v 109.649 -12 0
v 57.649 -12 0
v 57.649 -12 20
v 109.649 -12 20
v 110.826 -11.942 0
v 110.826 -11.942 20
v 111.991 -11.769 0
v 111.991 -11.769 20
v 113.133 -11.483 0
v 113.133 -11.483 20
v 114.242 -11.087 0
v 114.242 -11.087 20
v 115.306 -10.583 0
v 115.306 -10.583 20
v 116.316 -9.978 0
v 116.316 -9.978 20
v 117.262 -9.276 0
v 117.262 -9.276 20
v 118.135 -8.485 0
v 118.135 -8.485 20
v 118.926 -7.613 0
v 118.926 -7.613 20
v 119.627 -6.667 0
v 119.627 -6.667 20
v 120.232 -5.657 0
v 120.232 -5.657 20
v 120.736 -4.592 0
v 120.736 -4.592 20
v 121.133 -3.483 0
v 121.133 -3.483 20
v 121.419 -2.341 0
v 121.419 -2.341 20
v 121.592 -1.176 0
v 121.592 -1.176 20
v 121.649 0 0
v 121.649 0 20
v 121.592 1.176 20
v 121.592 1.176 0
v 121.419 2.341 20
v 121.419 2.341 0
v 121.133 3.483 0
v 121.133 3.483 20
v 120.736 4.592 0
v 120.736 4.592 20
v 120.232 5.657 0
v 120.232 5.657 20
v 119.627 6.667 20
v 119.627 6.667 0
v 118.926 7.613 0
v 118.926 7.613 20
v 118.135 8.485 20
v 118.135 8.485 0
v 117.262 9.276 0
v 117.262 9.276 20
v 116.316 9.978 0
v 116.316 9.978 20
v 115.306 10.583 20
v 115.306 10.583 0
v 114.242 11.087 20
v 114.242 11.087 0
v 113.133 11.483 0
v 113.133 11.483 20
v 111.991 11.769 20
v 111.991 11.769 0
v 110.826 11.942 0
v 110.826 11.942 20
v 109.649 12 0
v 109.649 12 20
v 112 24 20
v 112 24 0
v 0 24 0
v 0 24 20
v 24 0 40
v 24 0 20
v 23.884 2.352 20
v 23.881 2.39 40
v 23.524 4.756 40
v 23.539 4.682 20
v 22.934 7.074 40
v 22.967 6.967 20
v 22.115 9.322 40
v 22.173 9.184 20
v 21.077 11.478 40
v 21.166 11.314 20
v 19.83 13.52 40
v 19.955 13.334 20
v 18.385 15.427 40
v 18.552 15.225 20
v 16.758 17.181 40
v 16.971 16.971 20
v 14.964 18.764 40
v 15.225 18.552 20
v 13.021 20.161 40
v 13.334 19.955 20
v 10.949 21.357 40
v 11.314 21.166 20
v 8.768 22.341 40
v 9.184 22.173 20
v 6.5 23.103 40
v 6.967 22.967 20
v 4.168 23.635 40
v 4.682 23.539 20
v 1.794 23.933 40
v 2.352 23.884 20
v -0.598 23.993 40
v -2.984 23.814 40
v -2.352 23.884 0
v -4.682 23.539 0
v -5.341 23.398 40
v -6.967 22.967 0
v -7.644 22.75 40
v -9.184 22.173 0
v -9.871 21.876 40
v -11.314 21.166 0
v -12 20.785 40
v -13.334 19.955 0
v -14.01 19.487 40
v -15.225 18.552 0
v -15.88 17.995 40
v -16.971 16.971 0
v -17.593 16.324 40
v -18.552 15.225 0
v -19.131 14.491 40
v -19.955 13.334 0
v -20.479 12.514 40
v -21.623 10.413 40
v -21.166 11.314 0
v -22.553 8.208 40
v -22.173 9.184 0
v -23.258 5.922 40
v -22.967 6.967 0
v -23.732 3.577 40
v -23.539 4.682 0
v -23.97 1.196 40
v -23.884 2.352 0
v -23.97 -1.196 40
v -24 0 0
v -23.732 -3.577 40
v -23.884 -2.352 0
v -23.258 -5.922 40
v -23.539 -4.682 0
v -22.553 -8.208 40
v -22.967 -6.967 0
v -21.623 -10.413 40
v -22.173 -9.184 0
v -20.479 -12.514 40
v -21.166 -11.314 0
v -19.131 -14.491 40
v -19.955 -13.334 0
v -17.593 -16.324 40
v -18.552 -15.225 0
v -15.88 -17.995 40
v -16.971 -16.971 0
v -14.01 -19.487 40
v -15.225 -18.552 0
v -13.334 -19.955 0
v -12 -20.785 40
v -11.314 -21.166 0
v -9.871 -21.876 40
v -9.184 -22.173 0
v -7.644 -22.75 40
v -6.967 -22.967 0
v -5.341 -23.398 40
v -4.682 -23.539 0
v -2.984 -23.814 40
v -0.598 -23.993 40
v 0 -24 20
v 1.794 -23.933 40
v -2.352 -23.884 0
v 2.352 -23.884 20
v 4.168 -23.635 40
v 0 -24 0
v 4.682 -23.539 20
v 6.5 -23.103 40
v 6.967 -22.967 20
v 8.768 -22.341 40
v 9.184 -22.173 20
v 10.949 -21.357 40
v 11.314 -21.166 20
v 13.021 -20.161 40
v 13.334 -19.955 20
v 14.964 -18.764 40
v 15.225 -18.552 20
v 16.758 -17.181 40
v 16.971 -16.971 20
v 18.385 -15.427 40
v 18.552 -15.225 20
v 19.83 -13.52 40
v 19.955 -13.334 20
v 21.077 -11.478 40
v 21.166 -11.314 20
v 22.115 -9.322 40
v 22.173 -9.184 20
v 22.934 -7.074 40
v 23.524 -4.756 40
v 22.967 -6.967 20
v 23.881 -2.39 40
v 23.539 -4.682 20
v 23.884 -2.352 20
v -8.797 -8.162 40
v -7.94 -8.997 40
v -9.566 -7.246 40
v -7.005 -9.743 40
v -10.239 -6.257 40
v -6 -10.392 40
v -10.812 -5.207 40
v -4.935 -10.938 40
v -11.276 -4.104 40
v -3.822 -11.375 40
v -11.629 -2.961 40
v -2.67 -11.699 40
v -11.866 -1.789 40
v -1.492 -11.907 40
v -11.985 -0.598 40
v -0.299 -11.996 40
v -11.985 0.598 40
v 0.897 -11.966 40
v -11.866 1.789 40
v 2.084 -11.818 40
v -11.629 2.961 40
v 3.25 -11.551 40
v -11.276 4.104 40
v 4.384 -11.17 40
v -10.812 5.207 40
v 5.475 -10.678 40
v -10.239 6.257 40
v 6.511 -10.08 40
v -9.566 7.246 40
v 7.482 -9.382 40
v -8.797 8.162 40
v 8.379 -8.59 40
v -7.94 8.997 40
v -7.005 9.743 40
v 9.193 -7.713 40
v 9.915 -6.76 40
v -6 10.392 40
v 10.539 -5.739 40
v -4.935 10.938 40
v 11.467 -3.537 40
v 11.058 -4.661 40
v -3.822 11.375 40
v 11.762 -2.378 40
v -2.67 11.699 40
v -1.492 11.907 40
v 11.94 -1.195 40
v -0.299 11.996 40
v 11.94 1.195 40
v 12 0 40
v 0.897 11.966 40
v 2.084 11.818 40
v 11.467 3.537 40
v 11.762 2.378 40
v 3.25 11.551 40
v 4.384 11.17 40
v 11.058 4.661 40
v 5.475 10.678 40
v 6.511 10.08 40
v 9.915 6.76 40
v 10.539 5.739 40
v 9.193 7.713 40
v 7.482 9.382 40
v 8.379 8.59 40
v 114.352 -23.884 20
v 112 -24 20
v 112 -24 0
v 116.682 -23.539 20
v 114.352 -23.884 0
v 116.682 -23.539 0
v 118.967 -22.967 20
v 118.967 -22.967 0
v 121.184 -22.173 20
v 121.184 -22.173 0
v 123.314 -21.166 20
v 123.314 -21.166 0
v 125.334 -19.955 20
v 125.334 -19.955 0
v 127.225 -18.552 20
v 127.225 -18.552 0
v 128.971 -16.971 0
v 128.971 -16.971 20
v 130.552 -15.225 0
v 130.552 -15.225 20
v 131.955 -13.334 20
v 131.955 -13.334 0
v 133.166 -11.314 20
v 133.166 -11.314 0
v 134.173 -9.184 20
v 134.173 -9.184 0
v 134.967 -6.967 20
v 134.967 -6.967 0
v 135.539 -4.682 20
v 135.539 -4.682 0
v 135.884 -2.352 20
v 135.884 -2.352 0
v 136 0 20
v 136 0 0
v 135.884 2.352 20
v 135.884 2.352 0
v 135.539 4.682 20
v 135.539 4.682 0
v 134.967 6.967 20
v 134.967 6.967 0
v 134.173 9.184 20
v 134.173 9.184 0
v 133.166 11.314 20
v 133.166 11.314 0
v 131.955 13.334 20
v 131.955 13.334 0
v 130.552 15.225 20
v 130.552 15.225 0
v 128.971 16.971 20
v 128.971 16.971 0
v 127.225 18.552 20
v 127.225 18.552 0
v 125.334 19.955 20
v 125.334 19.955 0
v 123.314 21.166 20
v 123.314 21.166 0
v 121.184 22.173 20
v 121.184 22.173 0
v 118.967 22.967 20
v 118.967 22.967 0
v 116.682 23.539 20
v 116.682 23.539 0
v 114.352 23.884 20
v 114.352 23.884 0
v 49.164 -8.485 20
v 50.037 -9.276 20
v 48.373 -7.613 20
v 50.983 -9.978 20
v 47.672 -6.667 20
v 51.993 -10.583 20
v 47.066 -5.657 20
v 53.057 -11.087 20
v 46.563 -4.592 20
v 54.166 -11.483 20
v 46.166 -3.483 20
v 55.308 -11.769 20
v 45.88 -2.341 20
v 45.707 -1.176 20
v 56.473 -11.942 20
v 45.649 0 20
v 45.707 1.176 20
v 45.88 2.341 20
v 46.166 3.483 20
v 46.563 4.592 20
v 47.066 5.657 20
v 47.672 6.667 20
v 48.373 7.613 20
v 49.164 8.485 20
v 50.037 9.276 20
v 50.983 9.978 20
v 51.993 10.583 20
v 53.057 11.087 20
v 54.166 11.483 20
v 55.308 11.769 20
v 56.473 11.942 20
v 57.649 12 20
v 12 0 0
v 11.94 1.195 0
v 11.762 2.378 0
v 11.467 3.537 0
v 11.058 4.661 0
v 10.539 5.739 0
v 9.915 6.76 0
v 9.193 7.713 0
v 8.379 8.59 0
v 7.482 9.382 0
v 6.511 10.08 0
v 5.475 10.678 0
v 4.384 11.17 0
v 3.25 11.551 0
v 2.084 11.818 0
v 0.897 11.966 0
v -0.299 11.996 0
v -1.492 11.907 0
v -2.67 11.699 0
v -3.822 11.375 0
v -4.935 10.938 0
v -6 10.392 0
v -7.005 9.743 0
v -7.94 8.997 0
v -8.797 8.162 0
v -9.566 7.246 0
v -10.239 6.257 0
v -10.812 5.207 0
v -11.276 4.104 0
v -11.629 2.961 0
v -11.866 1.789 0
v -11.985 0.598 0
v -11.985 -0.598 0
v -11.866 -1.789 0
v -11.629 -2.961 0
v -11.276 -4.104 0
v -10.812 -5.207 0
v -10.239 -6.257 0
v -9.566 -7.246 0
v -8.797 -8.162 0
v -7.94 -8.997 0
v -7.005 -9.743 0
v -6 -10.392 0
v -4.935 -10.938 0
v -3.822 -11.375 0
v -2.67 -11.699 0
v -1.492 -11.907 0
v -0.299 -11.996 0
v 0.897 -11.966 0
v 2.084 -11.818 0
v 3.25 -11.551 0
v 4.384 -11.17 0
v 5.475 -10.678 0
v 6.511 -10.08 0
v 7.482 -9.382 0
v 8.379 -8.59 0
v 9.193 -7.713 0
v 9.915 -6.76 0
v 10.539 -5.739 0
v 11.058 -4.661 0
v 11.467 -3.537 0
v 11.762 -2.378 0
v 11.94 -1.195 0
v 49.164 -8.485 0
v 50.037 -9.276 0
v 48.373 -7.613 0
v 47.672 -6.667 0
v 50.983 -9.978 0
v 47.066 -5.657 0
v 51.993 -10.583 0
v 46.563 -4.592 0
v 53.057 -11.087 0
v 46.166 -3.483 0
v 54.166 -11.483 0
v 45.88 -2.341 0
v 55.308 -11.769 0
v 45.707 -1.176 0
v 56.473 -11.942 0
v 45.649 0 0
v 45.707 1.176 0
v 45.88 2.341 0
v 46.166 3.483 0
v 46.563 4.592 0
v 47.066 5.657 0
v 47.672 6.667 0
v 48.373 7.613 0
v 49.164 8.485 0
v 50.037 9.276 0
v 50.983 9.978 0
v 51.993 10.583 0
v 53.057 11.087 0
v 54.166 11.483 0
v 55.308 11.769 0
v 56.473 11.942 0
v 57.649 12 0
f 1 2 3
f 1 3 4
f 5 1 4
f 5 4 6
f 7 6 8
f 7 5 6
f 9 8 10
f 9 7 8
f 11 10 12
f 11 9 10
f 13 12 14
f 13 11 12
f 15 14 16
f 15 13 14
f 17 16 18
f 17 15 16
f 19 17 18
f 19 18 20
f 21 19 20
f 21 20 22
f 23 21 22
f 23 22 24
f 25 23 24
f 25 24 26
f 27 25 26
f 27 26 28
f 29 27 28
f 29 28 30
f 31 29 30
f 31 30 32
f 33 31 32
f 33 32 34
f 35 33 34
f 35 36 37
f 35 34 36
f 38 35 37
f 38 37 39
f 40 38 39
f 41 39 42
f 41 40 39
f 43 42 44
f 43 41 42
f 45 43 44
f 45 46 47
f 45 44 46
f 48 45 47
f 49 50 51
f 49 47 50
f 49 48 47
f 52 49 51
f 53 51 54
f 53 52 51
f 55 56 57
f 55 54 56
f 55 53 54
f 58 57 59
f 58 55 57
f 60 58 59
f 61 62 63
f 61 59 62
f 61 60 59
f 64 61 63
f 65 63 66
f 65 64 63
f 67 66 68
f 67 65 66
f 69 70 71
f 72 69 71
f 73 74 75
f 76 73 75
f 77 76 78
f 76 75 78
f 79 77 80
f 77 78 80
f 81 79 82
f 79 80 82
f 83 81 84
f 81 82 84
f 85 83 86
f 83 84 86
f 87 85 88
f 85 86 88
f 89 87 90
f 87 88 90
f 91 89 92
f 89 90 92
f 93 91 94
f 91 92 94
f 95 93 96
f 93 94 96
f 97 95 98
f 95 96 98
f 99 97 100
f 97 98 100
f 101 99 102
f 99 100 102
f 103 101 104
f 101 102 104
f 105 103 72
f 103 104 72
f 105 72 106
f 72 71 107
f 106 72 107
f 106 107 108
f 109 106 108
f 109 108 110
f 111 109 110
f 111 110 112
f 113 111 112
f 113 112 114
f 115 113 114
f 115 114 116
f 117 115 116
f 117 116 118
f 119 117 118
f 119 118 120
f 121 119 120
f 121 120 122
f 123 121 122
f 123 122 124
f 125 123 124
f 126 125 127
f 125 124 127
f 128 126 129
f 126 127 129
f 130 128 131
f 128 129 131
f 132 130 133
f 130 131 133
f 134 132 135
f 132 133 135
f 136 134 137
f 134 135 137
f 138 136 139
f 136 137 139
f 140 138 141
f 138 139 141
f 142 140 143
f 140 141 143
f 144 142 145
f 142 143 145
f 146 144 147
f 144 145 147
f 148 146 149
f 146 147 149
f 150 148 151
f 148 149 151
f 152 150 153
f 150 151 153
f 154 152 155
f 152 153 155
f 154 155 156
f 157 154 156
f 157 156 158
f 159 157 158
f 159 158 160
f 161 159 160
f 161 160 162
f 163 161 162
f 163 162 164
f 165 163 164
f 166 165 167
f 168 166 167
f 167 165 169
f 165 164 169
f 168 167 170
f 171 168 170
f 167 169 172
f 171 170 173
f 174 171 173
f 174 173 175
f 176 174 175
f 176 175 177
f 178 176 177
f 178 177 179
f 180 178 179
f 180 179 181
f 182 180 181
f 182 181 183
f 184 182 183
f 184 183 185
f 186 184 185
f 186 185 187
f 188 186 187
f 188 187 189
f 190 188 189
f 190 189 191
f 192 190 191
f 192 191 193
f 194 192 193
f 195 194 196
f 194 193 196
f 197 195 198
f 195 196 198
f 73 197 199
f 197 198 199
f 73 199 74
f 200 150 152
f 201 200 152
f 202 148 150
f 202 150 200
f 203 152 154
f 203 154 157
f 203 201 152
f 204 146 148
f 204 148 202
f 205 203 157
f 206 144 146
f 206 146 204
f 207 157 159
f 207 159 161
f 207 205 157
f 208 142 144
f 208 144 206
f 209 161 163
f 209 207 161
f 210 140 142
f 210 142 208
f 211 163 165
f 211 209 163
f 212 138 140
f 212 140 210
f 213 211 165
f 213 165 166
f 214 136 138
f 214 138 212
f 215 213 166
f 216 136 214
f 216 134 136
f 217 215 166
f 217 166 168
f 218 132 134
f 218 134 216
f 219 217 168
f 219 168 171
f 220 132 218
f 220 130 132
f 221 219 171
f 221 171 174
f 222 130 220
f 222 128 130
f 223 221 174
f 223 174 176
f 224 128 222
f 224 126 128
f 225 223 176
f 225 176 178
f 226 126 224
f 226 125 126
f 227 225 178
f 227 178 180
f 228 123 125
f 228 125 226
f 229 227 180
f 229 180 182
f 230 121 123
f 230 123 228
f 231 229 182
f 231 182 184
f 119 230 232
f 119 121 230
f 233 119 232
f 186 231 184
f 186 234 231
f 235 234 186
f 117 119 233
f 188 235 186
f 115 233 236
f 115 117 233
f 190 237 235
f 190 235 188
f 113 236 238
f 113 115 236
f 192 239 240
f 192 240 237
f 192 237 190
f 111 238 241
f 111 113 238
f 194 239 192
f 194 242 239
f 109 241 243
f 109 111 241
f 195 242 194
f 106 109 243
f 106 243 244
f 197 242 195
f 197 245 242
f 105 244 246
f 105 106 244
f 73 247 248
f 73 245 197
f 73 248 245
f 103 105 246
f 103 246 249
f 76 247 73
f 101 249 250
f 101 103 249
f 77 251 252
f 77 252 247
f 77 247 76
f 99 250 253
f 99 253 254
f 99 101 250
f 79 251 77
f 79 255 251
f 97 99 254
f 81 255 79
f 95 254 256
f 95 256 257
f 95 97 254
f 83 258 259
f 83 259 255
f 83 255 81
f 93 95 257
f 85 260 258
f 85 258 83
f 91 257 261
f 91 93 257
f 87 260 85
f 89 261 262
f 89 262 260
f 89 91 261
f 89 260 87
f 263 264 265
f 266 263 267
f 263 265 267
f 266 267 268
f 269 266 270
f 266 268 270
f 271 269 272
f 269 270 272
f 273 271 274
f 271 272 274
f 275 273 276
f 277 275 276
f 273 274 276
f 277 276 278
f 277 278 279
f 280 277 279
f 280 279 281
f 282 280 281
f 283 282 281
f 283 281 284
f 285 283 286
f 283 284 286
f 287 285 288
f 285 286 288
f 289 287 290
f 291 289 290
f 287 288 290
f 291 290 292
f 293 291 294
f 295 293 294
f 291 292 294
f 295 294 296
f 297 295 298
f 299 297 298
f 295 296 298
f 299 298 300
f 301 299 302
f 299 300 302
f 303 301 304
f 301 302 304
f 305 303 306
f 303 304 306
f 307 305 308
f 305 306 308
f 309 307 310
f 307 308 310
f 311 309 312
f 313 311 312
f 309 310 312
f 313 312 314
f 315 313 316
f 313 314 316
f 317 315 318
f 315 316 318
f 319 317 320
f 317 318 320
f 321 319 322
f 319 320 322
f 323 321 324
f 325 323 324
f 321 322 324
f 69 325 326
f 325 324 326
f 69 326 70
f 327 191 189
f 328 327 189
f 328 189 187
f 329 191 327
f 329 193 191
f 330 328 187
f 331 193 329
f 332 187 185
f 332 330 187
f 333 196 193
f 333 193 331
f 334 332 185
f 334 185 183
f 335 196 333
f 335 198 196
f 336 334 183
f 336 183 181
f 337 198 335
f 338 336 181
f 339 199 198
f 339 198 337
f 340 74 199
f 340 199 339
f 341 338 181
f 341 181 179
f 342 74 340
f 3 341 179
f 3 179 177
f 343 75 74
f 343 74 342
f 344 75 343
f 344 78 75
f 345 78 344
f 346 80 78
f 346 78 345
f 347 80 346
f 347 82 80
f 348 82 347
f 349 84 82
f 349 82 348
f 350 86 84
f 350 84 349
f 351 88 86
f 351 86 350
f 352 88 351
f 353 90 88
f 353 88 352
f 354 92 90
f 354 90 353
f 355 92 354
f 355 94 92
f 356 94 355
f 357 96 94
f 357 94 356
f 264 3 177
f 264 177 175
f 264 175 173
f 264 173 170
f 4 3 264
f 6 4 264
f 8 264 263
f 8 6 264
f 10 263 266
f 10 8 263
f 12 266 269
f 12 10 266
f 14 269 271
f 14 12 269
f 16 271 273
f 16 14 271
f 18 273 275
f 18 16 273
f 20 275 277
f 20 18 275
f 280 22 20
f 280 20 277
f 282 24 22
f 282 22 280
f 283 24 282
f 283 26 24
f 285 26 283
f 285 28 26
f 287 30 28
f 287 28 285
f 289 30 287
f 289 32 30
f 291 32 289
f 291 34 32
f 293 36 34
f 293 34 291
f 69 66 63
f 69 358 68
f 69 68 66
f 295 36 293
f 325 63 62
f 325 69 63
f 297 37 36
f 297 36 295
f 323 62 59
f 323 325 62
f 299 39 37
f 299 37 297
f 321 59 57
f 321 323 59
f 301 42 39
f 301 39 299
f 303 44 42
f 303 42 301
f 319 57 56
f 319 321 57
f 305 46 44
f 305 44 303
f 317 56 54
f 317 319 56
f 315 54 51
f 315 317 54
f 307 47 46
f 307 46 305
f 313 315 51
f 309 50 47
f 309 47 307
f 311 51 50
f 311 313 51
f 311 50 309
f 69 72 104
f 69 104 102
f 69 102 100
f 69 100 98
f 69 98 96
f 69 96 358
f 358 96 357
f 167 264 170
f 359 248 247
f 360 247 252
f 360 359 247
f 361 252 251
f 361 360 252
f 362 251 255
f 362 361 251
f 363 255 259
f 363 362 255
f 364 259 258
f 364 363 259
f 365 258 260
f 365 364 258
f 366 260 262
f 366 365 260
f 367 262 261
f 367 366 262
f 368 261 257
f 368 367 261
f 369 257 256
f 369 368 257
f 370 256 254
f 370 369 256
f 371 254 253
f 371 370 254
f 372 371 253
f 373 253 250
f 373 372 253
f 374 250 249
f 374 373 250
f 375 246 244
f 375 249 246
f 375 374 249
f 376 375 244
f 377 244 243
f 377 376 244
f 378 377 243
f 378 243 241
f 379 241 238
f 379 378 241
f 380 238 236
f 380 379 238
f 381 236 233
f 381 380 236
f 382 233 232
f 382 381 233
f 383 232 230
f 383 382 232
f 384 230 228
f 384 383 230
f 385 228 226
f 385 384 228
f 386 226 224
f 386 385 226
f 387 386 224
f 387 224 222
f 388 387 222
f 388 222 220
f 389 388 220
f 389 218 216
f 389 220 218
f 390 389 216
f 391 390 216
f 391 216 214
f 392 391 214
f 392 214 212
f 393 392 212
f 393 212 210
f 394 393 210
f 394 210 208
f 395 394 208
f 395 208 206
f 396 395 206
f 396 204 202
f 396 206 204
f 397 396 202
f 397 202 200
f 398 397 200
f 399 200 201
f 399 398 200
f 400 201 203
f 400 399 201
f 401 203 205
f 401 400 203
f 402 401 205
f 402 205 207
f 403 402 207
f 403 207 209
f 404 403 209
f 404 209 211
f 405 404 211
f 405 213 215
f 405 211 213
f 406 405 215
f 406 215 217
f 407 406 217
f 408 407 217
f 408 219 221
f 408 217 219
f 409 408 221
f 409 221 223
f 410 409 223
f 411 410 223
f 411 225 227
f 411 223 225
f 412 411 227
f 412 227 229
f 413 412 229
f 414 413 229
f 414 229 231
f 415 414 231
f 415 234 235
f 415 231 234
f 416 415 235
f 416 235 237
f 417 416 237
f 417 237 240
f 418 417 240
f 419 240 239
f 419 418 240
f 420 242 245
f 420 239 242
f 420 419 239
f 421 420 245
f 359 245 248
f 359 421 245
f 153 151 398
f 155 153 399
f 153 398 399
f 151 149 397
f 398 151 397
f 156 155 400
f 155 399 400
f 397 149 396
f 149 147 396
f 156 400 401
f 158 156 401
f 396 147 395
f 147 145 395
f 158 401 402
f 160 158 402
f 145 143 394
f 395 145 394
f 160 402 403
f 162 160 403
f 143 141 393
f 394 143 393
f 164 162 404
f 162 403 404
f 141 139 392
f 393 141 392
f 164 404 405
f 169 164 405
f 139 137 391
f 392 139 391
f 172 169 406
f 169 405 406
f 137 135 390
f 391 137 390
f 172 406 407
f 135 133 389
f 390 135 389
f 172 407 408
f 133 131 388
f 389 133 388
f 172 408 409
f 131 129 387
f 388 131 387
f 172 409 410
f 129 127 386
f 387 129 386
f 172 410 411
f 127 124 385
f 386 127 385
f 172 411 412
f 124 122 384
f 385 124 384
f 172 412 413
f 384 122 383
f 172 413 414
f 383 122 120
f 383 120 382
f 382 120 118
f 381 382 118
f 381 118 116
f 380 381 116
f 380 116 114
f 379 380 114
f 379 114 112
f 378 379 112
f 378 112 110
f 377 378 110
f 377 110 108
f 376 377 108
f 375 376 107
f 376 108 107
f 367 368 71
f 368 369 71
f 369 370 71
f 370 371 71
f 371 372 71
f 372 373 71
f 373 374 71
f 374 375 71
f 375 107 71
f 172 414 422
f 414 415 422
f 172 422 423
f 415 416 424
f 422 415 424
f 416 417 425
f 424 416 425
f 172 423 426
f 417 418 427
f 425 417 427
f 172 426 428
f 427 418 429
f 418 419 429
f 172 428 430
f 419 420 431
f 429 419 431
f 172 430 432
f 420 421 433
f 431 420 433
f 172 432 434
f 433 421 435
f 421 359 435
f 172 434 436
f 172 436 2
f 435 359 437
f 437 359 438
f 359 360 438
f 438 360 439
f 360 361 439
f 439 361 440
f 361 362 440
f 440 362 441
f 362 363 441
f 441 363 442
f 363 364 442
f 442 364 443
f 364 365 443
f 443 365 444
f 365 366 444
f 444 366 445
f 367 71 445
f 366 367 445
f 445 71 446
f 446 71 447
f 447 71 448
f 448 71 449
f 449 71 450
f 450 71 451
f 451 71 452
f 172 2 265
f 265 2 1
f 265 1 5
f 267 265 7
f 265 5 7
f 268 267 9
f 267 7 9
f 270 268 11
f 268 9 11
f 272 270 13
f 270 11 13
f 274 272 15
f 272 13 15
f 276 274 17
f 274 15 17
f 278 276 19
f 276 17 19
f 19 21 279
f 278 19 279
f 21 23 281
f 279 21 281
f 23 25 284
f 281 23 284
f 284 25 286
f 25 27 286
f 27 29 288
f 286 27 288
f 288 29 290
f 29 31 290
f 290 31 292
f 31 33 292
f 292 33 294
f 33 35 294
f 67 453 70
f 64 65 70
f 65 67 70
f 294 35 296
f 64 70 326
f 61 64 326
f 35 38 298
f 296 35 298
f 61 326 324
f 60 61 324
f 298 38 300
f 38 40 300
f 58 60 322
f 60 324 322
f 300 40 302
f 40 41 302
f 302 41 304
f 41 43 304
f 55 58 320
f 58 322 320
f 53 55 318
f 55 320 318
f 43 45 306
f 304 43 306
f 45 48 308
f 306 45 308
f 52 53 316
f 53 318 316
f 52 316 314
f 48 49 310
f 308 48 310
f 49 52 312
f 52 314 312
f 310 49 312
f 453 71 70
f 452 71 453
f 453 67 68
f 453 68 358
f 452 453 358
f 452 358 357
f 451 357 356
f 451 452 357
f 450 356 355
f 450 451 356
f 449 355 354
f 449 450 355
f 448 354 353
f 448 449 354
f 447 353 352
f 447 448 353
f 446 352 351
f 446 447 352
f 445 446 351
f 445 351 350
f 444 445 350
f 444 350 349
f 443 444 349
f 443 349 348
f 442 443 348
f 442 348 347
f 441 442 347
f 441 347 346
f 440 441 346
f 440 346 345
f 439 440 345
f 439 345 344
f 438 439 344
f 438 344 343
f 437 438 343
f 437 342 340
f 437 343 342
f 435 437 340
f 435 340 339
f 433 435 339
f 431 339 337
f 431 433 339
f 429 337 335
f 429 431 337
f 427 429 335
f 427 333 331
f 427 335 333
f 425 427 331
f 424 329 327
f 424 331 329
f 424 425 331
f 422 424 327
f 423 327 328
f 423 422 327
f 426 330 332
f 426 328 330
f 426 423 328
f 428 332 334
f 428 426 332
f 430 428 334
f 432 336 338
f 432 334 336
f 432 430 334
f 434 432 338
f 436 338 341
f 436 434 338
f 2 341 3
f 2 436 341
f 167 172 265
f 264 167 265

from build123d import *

# Parameters (mm, degrees)
F1_DEPTH = 20
F2_R     = 24
F3_DEPTH = 40
F4_R     = 12
F5_DEPTH = 40.001


with BuildPart() as f1:
    # F0 (on Top) → F1 (new body)
    with BuildSketch(Plane.XY):
        with BuildLine():
            Line((112, 24), (0, 24))
            ThreePointArc((0, 24), (-24, 0), (0, -24))
            Line((0, -24), (112, -24))
            ThreePointArc((112, -24), (136, 0), (112, 24))
        make_face()
    extrude(amount=F1_DEPTH)

    # F2 (on Top) → F3 (join)
    with BuildSketch(Plane.XY):
        Circle(F2_R)
    extrude(amount=F3_DEPTH)

    # F4 (on Top) → F5 (cut, through all)
    with BuildSketch(Plane.XY):
        Circle(F4_R)
        with BuildLine():
            Line((109.649421, 12), (57.649421, 12))
            ThreePointArc((57.649421, 12), (45.649421, 0), (57.649421, -12))
            Line((57.649421, -12), (109.649421, -12))
            ThreePointArc((109.649421, -12), (121.649421, 0), (109.649421, 12))
        make_face()
    extrude(amount=F5_DEPTH, mode=Mode.SUBTRACT)


solid = f1.part
